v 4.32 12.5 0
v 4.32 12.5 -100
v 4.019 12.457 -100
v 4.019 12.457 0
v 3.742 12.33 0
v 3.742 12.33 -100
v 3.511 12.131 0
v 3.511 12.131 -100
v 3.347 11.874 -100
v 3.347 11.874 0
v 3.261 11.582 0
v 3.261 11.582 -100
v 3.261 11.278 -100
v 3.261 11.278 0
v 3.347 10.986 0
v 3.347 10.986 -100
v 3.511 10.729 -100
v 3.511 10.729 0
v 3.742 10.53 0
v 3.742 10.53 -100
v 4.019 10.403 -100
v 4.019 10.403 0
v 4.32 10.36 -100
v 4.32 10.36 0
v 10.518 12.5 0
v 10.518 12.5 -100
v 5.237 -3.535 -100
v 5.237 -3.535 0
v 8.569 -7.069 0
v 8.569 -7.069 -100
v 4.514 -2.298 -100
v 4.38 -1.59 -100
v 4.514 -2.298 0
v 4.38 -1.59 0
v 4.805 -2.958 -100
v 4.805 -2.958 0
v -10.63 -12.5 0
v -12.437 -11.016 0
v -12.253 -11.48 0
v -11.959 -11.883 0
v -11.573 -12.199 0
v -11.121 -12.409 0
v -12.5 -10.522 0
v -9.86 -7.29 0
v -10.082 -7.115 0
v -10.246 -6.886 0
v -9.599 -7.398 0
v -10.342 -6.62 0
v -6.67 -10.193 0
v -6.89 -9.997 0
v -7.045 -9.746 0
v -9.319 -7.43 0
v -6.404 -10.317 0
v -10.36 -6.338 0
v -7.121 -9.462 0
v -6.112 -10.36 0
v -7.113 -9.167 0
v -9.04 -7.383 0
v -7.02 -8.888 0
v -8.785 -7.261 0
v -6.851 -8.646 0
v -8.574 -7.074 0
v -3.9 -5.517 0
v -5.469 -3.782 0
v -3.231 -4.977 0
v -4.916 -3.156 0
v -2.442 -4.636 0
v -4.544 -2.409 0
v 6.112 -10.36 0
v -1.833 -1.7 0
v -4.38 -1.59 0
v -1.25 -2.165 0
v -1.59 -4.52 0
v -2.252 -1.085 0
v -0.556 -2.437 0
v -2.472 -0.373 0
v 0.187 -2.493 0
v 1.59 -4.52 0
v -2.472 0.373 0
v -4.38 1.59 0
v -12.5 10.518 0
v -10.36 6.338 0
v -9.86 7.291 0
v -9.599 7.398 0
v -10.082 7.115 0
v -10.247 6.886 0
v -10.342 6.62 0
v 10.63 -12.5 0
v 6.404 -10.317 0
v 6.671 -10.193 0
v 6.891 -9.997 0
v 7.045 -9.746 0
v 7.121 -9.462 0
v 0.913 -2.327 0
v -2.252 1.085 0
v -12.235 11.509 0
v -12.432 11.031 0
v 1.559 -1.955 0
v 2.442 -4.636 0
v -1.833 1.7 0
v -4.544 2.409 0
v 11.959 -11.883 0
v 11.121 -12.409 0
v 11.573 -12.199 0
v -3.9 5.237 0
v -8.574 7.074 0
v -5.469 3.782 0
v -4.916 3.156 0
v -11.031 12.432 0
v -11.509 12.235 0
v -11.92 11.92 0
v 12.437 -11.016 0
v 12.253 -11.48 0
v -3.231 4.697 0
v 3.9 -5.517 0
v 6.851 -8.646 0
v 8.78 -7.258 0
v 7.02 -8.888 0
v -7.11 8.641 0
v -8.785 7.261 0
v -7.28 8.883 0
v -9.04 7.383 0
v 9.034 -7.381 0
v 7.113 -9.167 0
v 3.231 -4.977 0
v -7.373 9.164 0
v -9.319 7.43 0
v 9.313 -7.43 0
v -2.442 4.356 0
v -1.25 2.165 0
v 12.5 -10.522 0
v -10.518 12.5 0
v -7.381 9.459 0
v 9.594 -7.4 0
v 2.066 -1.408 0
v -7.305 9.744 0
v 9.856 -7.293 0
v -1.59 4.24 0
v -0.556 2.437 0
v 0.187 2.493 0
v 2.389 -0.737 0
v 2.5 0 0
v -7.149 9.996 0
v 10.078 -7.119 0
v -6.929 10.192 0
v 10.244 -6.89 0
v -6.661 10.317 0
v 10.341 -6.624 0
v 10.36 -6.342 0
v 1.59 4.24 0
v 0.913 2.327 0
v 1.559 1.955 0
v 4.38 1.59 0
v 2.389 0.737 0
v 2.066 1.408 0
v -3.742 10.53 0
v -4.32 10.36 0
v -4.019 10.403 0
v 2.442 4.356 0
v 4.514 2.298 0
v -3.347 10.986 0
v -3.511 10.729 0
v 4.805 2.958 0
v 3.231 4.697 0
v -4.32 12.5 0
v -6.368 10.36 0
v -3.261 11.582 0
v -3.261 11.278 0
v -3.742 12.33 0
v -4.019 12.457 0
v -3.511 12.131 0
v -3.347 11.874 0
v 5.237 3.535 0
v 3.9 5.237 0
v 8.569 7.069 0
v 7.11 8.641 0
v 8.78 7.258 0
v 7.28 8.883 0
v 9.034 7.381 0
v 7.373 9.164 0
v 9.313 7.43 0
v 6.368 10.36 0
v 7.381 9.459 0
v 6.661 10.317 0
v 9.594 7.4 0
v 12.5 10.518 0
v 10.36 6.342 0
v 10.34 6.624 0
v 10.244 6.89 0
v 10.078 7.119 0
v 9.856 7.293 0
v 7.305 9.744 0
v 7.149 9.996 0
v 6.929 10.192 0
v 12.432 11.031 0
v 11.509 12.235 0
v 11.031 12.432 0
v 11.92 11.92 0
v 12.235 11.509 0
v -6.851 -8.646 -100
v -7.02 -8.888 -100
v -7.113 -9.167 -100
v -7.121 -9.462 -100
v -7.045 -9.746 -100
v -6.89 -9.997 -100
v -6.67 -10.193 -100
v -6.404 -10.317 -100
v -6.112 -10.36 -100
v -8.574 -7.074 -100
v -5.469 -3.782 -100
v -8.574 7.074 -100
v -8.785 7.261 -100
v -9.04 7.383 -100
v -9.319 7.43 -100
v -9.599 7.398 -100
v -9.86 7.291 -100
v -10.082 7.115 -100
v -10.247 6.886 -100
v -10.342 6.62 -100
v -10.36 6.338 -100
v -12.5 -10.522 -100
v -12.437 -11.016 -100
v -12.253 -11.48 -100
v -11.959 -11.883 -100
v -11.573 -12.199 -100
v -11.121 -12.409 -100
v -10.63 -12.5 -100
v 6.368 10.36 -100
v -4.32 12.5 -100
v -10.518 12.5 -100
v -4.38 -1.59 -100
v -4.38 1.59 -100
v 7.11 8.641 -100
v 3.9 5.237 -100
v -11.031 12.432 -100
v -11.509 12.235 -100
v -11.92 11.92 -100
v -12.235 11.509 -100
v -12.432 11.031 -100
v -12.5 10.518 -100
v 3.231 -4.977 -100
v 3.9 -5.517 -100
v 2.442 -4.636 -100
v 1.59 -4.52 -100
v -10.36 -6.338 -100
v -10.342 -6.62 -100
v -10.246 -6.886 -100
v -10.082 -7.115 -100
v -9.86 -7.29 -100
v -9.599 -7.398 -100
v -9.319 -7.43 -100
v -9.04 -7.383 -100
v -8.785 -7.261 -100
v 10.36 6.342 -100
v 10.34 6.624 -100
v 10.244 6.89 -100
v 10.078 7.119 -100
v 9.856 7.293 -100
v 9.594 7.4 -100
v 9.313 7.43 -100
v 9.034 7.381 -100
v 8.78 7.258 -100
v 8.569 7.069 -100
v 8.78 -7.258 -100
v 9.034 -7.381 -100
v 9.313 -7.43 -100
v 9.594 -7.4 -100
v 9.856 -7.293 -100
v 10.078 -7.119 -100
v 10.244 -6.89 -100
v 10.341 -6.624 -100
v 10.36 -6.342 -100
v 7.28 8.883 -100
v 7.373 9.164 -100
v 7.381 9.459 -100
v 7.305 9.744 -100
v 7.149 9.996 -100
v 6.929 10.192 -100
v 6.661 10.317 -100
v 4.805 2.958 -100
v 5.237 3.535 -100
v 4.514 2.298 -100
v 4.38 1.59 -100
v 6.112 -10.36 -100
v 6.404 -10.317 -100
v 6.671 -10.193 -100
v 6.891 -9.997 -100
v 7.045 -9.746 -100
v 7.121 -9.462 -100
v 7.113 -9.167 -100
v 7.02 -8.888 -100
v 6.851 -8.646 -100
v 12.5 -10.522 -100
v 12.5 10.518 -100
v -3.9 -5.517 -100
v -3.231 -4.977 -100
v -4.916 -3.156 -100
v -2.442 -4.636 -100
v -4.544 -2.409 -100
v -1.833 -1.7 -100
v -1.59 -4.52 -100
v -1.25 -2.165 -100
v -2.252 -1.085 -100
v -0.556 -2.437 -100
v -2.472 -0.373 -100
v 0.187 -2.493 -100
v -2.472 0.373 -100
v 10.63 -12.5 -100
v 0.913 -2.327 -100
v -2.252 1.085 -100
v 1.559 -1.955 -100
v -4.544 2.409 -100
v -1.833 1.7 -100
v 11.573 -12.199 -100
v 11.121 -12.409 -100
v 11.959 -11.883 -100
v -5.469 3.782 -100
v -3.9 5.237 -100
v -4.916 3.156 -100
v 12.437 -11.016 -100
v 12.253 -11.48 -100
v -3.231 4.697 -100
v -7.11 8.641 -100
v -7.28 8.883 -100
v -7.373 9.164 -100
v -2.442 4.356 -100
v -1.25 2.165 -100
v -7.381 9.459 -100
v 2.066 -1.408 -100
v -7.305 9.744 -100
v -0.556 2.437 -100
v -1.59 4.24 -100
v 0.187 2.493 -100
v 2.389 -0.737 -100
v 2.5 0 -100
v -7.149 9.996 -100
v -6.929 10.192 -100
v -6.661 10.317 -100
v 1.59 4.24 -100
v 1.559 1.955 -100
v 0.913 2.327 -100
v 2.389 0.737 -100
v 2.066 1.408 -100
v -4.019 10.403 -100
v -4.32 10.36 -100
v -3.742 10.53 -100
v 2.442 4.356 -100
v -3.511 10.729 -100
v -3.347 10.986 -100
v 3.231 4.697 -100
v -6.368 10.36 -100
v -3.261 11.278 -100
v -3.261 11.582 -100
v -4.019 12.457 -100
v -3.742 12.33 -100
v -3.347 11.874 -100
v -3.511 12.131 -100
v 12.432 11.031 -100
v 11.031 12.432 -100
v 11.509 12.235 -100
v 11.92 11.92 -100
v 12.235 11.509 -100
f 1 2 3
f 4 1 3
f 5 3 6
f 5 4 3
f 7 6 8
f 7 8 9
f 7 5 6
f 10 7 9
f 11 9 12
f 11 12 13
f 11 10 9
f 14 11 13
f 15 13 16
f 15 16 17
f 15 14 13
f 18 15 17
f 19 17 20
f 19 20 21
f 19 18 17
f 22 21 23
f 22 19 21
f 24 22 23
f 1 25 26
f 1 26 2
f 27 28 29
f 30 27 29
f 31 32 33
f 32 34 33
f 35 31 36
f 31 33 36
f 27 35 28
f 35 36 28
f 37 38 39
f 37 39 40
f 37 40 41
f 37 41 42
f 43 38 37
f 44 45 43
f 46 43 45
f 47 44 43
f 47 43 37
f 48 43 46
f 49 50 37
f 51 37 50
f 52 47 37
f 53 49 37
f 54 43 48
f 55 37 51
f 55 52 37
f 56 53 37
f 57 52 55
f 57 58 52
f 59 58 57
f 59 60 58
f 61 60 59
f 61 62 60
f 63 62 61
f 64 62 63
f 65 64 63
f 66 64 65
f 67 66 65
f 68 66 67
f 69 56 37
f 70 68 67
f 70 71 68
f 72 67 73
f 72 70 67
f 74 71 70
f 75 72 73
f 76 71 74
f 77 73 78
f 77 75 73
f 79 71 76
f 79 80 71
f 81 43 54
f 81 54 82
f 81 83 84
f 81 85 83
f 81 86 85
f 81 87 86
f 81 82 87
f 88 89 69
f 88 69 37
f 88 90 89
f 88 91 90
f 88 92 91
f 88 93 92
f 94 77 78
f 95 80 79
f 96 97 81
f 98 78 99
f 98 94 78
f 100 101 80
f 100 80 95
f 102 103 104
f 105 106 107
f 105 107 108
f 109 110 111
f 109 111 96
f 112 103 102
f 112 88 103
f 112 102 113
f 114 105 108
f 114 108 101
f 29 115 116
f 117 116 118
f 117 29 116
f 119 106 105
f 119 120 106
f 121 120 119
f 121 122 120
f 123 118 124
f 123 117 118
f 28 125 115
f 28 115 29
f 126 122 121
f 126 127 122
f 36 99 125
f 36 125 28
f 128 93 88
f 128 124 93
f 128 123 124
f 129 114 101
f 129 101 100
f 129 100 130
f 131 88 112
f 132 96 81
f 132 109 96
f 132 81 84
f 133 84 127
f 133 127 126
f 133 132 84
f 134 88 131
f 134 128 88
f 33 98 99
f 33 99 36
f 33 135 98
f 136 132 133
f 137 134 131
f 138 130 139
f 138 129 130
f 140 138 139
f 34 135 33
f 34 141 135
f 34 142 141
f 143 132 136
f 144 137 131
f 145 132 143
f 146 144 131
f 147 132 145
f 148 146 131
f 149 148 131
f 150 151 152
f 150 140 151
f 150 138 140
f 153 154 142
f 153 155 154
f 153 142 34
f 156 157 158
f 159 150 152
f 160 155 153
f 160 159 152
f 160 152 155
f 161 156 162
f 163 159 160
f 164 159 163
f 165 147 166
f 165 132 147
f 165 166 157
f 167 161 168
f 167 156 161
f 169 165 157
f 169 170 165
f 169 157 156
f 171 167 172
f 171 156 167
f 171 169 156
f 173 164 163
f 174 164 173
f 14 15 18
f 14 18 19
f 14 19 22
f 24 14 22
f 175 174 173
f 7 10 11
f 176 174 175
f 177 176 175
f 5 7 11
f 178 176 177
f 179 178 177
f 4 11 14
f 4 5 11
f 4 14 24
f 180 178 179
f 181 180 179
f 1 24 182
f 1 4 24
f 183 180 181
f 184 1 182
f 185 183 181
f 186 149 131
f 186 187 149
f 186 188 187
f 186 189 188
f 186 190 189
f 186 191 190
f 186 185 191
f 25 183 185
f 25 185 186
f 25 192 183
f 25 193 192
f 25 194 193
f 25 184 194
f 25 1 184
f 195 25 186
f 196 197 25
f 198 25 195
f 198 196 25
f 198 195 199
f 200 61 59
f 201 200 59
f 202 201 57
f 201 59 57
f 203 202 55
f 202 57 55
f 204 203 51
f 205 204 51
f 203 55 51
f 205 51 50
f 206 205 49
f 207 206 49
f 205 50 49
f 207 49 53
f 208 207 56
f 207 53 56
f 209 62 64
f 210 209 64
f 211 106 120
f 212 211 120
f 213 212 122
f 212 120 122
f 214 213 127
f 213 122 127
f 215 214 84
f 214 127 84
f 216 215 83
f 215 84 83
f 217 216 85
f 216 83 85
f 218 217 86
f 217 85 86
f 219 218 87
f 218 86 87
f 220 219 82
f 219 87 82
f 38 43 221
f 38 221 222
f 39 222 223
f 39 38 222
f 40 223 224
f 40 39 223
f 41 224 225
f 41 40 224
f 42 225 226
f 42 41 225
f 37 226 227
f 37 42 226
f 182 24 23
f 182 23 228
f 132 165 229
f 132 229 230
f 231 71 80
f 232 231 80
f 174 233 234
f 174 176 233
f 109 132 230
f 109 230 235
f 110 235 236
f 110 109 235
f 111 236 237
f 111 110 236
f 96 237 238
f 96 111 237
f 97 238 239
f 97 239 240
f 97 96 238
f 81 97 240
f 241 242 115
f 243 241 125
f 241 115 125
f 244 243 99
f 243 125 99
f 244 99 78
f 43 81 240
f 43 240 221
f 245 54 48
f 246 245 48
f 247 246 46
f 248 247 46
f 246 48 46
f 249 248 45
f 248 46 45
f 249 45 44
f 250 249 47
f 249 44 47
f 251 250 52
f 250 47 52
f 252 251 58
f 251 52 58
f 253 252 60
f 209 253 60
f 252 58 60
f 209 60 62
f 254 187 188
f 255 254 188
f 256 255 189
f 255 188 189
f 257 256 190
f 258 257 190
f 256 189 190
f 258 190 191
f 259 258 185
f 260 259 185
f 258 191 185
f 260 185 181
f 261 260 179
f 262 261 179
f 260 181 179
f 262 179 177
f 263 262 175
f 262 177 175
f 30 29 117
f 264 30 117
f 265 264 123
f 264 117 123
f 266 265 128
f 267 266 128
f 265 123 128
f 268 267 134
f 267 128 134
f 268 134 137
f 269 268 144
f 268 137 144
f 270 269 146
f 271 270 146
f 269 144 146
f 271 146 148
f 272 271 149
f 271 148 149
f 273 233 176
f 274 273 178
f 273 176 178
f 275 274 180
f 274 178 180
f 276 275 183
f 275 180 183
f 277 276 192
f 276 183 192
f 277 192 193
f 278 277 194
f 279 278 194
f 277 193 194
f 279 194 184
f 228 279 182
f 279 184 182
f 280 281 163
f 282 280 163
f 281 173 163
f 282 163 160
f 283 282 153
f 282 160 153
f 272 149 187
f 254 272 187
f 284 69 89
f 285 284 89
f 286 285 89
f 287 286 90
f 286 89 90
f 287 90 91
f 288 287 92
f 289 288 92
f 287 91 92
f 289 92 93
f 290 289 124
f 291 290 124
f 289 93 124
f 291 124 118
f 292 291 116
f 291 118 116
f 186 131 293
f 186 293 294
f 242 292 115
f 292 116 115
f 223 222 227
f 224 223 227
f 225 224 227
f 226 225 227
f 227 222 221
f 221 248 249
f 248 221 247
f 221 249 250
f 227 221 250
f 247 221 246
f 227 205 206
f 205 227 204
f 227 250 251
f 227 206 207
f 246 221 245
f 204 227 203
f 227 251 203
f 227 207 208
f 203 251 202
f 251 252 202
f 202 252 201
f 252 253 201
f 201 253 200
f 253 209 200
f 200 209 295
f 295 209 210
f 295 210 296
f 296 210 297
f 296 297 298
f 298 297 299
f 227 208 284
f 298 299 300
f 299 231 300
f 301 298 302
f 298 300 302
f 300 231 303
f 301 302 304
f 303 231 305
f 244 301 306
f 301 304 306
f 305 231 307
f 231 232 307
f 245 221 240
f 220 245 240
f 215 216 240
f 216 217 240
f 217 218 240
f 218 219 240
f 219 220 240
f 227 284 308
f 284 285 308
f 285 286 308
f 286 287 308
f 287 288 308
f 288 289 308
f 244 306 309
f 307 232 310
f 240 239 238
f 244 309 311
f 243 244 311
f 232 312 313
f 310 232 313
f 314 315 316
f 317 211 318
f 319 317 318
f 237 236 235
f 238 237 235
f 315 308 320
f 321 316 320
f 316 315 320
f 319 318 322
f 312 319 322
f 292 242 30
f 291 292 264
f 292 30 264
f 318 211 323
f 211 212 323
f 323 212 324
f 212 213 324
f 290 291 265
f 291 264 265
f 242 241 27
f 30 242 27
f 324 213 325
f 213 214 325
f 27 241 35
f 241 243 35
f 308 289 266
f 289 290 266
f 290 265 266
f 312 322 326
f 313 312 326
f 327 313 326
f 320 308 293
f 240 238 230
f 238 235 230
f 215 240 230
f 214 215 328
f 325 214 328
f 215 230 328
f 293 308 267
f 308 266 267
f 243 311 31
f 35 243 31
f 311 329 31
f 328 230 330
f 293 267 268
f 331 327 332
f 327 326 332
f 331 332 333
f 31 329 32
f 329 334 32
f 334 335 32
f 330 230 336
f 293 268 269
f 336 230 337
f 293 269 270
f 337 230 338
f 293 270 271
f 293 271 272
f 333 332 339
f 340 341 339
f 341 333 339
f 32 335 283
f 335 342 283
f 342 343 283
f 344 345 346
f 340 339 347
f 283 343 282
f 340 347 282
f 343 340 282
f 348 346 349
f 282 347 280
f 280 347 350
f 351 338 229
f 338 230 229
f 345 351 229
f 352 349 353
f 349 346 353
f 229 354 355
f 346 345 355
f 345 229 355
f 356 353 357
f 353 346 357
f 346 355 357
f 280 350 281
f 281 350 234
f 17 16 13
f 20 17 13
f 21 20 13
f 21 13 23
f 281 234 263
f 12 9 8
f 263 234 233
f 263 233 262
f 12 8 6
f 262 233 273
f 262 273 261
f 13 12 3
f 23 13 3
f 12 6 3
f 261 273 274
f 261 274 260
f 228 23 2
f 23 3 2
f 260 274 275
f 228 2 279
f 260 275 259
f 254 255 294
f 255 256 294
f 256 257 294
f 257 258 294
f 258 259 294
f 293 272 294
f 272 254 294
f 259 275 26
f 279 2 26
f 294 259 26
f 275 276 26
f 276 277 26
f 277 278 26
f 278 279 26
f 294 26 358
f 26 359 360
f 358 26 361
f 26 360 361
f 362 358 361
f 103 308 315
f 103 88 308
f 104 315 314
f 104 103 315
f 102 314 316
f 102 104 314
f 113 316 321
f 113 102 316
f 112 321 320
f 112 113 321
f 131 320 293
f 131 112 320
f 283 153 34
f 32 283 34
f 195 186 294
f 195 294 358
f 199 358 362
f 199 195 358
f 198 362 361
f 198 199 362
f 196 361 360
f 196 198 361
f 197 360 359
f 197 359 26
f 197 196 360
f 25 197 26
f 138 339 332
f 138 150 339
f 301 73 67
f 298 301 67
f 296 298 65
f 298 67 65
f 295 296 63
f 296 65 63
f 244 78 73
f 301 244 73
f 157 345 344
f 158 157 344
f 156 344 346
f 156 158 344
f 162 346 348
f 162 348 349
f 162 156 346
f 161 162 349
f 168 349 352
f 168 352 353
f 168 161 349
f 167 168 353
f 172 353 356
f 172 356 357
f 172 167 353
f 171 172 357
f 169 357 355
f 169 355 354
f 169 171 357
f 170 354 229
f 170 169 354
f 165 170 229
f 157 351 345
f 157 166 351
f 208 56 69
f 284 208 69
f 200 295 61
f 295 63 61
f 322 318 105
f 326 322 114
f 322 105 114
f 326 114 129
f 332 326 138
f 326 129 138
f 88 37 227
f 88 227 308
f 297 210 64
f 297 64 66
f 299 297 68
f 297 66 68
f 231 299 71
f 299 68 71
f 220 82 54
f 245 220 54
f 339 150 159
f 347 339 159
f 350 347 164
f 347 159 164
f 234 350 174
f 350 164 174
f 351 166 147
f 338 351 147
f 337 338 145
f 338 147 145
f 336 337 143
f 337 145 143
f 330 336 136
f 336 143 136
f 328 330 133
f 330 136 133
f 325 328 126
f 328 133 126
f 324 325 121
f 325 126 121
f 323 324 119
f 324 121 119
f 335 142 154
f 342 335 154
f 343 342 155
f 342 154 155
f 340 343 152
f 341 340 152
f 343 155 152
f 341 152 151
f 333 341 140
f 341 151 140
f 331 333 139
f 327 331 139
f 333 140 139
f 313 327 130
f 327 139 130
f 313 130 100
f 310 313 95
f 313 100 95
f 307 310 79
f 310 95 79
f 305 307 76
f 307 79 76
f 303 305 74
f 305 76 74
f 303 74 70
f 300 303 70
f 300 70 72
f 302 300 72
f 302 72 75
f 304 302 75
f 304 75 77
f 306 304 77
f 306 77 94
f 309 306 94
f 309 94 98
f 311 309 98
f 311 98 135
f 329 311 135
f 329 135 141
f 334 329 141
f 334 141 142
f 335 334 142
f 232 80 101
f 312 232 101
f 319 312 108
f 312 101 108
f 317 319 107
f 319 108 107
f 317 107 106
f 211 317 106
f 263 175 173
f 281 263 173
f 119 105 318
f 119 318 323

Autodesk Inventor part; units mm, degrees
ref_plane "YZ Plane" through (0, 0, 0) normal (1, 0, 0) x (0, 1, 0)
ref_plane "XZ Plane" through (0, 0, 0) normal (0, 1, 0) x (-1, 0, 0)
ref_plane "XY Plane" through (0, 0, 0) normal (0, 0, 1) x (1, 0, 0)
sketch "Sketch1" plane through (0, 0, 0) normal (0, 0, 1) x (1, 0, 0)
  arc A0 (3.9004, -5.517) -> (1.5898, -4.52) centre (1.5898, -7.6958) ccw
  line L0 (6.8514, -8.6465) -> (3.9004, -5.517)
  arc A1 (6.1121, -10.36) -> (6.8514, -8.6465) centre (6.1121, -9.3437) ccw
  line L1 (-6.1121, -10.36) -> (6.1121, -10.36)
  arc A2 (-6.8514, -8.6465) -> (-6.1121, -10.36) centre (-6.1121, -9.3437) ccw
  line L2 (-3.9004, -5.517) -> (-6.8514, -8.6465)
  arc A3 (-1.5898, -4.52) -> (-3.9004, -5.517) centre (-1.5898, -7.6958) ccw
  line L3 (1.5898, -4.52) -> (-1.5898, -4.52)
  arc A4 (-10.36, -6.3382) -> (-8.5738, -7.0738) centre (-9.3466, -6.4137) ccw
  line L4 (-10.36, 6.3382) -> (-10.36, -6.3382)
  arc A5 (-8.5738, 7.0738) -> (-10.36, 6.3382) centre (-9.3466, 6.4137) ccw
  line L5 (-5.4693, 3.7815) -> (-8.5738, 7.0738)
  arc A6 (-4.38, 1.5898) -> (-5.4693, 3.7815) centre (-7.549, 1.3814) ccw
  line L6 (-4.38, -1.5898) -> (-4.38, 1.5898)
  arc A7 (-5.4693, -3.7815) -> (-4.38, -1.5898) centre (-7.549, -1.3814) ccw
  line L7 (-8.5738, -7.0738) -> (-5.4693, -3.7815)
  arc A8 (8.5693, -7.069) -> (10.36, -6.3423) centre (9.3463, -6.4139) ccw
  line L8 (5.2366, -3.5348) -> (8.5693, -7.069)
  arc A9 (4.38, -1.5898) -> (5.2366, -3.5348) centre (7.5472, -1.356) ccw
  line L9 (4.38, 1.5898) -> (4.38, -1.5898)
  arc A10 (5.2366, 3.5348) -> (4.38, 1.5898) centre (7.5472, 1.356) ccw
  line L10 (8.5693, 7.069) -> (5.2366, 3.5348)
  arc A11 (10.36, 6.3423) -> (8.5693, 7.069) centre (9.3463, 6.4139) ccw
  line L11 (10.36, -6.3423) -> (10.36, 6.3423)
  circle A12 centre (0, 0) radius 2.5
  arc A13 (-4.32, 10.36) -> (-4.32, 12.5) centre (-4.32, 11.43) ccw
  line L12 (-4.32, 12.5) -> (-10.5183, 12.5)
  arc A14 (-10.5183, 12.5) -> (-12.5, 10.5183) centre (-10.5183, 10.5183) ccw
  line L13 (-12.5, 10.5183) -> (-12.5, -10.5215)
  arc A15 (-12.5, -10.5215) -> (-10.6304, -12.5) centre (-10.5183, -10.5215) ccw
  line L14 (-10.6304, -12.5) -> (10.6304, -12.5)
  arc A16 (10.6304, -12.5) -> (12.5, -10.5215) centre (10.5183, -10.5215) ccw
  line L15 (12.5, -10.5215) -> (12.5, 10.5183)
  arc A17 (12.5, 10.5183) -> (10.5183, 12.5) centre (10.5183, 10.5183) ccw
  line L16 (10.5183, 12.5) -> (4.32, 12.5)
  arc A18 (4.32, 12.5) -> (4.32, 10.36) centre (4.32, 11.43) ccw
  line L17 (4.32, 10.36) -> (6.3685, 10.36)
  arc A19 (7.1102, 8.641) -> (6.3685, 10.36) centre (6.3685, 9.3405) ccw
  line L18 (7.1102, 8.641) -> (3.9004, 5.237)
  arc A20 (1.5898, 4.24) -> (3.9004, 5.237) centre (1.5898, 7.4158) ccw
  line L19 (1.5898, 4.24) -> (-1.5898, 4.24)
  arc A21 (-3.9004, 5.237) -> (-1.5898, 4.24) centre (-1.5898, 7.4158) ccw
  line L20 (-3.9004, 5.237) -> (-7.1102, 8.641)
  arc A22 (-6.3685, 10.36) -> (-7.1102, 8.641) centre (-6.3685, 9.3405) ccw
  line L21 (-6.3685, 10.36) -> (-4.32, 10.36)
extrude "Extrusion1" add sketch "Sketch1" against normal blind 100
properties part number "25-2501"
